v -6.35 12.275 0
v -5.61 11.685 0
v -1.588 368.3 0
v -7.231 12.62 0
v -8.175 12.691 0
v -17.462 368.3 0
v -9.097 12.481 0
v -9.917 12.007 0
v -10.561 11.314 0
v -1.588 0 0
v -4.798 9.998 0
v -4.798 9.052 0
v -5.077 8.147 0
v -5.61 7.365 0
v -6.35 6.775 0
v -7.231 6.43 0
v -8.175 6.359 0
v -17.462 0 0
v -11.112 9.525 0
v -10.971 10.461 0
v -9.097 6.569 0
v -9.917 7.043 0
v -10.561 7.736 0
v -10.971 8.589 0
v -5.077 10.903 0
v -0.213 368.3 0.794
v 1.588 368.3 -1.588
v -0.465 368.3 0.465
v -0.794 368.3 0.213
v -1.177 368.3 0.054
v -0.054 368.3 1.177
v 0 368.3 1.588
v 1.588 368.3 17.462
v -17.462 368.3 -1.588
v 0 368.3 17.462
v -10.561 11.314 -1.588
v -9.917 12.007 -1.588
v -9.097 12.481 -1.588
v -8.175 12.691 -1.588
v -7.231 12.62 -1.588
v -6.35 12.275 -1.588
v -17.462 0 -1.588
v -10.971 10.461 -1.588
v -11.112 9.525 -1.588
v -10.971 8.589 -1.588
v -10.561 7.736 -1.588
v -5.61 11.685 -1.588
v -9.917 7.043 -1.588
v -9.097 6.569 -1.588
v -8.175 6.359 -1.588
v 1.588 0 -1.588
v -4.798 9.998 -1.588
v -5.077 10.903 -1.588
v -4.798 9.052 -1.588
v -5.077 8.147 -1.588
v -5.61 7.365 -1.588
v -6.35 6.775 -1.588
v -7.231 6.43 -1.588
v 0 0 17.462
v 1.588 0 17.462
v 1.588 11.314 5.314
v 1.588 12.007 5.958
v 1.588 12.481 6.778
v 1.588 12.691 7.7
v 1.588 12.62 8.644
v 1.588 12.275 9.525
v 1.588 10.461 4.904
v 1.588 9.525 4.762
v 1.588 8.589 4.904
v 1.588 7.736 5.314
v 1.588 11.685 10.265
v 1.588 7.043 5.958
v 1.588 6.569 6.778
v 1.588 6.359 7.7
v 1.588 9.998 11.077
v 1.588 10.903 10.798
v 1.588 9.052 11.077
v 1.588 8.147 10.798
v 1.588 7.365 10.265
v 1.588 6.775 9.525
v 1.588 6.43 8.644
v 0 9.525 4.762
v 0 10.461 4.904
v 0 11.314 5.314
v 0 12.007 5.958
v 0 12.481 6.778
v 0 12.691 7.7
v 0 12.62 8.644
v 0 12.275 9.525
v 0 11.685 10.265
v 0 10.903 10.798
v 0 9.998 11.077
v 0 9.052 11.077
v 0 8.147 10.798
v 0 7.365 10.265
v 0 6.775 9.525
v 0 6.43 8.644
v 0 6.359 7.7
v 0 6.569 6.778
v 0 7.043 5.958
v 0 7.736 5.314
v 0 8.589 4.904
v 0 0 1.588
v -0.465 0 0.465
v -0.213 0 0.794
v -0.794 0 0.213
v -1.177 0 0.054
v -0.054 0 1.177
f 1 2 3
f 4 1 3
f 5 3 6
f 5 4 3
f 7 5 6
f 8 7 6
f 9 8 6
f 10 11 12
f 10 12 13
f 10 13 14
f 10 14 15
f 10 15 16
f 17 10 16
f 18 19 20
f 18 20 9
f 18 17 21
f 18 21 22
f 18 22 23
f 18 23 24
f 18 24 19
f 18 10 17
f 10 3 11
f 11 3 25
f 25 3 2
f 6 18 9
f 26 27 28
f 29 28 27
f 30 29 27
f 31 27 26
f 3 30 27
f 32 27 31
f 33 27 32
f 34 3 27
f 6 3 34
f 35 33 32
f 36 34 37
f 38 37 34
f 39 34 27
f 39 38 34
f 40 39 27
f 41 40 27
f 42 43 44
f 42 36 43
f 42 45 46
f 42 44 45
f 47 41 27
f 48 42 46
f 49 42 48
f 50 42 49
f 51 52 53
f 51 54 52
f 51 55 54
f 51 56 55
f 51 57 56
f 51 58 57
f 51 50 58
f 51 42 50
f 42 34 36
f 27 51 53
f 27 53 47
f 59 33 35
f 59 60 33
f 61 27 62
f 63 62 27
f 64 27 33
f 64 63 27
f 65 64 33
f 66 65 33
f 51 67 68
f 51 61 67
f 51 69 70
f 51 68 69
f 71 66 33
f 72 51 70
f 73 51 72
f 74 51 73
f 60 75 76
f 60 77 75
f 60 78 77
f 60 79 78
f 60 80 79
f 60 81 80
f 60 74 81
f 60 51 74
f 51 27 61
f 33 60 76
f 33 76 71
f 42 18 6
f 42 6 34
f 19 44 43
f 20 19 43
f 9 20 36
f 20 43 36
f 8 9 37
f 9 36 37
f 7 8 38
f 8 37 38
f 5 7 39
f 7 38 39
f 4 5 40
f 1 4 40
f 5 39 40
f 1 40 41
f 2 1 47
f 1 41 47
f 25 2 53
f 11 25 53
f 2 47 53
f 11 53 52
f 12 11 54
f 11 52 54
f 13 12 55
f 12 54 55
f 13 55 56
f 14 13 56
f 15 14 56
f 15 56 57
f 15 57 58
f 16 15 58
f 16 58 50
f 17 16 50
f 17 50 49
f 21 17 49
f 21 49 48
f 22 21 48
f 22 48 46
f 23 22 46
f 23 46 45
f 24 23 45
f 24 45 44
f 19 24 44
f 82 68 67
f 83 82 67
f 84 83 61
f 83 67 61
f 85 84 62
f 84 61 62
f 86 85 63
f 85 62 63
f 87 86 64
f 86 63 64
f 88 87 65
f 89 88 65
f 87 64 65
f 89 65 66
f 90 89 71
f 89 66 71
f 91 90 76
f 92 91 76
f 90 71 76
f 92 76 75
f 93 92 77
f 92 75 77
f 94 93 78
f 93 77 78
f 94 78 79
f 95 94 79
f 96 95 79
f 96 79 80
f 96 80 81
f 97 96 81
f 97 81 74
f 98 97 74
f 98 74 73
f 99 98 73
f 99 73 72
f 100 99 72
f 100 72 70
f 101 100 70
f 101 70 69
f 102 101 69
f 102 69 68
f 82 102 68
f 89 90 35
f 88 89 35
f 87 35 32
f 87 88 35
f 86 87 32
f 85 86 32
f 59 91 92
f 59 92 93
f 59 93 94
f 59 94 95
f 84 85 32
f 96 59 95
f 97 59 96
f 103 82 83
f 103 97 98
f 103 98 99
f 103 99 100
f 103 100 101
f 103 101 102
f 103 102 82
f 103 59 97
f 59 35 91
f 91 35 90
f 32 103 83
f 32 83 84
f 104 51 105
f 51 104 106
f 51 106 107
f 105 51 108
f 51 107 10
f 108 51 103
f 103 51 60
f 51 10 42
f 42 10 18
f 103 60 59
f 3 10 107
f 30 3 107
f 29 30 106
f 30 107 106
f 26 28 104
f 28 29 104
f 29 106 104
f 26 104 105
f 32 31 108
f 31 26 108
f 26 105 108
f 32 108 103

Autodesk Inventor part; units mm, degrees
ref_plane "YZ Plane" through (0, 0, 0) normal (1, 0, 0) x (0, 1, 0)
ref_plane "XZ Plane" through (0, 0, 0) normal (0, 1, 0) x (-1, 0, 0)
ref_plane "XY Plane" through (0, 0, 0) normal (0, 0, 1) x (1, 0, 0)
sketch "Sketch1" plane through (0, 0, 0) normal (0, 1, 0) x (-1, 0, 0)
  line L0 (0, 17.4625) -> (0, 1.5875)
  line L1 (1.5875, 0) -> (17.4625, 0)
  line L2 (17.4625, 0) -> (17.4625, -1.5875)
  line L3 (17.4625, -1.5875) -> (-1.5875, -1.5875)
  line L4 (-1.5875, -1.5875) -> (-1.5875, 17.4625)
  line L5 (-1.5875, 17.4625) -> (0, 17.4625)
  arc A0 (0, 1.5875) -> (1.5875, 0) centre (1.5875, 1.5875) ccw
  point P0 (0, 0)
  dimension "d0" = 1.5875
  dimension "d1" = 19.05
  dimension "d2" = 1.5875
extrude "Extrusion1" add sketch "Sketch1" along normal blind 368.3
sketch "Sketch2" plane through (1.5875, 0, -1.5875) normal (0, 0, -1) x (-1, 0, 0)
  line L0 (19.05, 0) -> (0, 0) construction
  line L1 (9.525, 0) -> (9.525, 443.5725) construction
  circle A0 centre (9.525, 9.525) radius 3.175
  point P0 (1.5875, 0)
  dimension "d5" = 6.35
  dimension "d6" = 9.525
extrude "Extrusion2" cut sketch "Sketch2" against normal through all
sketch "Sketch3" plane through (1.5875, 0, 17.4625) normal (1, 0, 0) x (0, 0, -1)
  line L0 (19.05, 0) -> (0, 0) construction
  line L1 (9.525, 0) -> (9.525, 23.4407) construction
  circle A0 centre (9.525, 9.525) radius 3.175
  point P0 (17.4625, 0)
  dimension "d9" = 6.35
  dimension "d10" = 9.525
extrude "Extrusion3" cut sketch "Sketch3" against normal through all
properties part number "Long Wall Support" material "Aluminum 6061"
